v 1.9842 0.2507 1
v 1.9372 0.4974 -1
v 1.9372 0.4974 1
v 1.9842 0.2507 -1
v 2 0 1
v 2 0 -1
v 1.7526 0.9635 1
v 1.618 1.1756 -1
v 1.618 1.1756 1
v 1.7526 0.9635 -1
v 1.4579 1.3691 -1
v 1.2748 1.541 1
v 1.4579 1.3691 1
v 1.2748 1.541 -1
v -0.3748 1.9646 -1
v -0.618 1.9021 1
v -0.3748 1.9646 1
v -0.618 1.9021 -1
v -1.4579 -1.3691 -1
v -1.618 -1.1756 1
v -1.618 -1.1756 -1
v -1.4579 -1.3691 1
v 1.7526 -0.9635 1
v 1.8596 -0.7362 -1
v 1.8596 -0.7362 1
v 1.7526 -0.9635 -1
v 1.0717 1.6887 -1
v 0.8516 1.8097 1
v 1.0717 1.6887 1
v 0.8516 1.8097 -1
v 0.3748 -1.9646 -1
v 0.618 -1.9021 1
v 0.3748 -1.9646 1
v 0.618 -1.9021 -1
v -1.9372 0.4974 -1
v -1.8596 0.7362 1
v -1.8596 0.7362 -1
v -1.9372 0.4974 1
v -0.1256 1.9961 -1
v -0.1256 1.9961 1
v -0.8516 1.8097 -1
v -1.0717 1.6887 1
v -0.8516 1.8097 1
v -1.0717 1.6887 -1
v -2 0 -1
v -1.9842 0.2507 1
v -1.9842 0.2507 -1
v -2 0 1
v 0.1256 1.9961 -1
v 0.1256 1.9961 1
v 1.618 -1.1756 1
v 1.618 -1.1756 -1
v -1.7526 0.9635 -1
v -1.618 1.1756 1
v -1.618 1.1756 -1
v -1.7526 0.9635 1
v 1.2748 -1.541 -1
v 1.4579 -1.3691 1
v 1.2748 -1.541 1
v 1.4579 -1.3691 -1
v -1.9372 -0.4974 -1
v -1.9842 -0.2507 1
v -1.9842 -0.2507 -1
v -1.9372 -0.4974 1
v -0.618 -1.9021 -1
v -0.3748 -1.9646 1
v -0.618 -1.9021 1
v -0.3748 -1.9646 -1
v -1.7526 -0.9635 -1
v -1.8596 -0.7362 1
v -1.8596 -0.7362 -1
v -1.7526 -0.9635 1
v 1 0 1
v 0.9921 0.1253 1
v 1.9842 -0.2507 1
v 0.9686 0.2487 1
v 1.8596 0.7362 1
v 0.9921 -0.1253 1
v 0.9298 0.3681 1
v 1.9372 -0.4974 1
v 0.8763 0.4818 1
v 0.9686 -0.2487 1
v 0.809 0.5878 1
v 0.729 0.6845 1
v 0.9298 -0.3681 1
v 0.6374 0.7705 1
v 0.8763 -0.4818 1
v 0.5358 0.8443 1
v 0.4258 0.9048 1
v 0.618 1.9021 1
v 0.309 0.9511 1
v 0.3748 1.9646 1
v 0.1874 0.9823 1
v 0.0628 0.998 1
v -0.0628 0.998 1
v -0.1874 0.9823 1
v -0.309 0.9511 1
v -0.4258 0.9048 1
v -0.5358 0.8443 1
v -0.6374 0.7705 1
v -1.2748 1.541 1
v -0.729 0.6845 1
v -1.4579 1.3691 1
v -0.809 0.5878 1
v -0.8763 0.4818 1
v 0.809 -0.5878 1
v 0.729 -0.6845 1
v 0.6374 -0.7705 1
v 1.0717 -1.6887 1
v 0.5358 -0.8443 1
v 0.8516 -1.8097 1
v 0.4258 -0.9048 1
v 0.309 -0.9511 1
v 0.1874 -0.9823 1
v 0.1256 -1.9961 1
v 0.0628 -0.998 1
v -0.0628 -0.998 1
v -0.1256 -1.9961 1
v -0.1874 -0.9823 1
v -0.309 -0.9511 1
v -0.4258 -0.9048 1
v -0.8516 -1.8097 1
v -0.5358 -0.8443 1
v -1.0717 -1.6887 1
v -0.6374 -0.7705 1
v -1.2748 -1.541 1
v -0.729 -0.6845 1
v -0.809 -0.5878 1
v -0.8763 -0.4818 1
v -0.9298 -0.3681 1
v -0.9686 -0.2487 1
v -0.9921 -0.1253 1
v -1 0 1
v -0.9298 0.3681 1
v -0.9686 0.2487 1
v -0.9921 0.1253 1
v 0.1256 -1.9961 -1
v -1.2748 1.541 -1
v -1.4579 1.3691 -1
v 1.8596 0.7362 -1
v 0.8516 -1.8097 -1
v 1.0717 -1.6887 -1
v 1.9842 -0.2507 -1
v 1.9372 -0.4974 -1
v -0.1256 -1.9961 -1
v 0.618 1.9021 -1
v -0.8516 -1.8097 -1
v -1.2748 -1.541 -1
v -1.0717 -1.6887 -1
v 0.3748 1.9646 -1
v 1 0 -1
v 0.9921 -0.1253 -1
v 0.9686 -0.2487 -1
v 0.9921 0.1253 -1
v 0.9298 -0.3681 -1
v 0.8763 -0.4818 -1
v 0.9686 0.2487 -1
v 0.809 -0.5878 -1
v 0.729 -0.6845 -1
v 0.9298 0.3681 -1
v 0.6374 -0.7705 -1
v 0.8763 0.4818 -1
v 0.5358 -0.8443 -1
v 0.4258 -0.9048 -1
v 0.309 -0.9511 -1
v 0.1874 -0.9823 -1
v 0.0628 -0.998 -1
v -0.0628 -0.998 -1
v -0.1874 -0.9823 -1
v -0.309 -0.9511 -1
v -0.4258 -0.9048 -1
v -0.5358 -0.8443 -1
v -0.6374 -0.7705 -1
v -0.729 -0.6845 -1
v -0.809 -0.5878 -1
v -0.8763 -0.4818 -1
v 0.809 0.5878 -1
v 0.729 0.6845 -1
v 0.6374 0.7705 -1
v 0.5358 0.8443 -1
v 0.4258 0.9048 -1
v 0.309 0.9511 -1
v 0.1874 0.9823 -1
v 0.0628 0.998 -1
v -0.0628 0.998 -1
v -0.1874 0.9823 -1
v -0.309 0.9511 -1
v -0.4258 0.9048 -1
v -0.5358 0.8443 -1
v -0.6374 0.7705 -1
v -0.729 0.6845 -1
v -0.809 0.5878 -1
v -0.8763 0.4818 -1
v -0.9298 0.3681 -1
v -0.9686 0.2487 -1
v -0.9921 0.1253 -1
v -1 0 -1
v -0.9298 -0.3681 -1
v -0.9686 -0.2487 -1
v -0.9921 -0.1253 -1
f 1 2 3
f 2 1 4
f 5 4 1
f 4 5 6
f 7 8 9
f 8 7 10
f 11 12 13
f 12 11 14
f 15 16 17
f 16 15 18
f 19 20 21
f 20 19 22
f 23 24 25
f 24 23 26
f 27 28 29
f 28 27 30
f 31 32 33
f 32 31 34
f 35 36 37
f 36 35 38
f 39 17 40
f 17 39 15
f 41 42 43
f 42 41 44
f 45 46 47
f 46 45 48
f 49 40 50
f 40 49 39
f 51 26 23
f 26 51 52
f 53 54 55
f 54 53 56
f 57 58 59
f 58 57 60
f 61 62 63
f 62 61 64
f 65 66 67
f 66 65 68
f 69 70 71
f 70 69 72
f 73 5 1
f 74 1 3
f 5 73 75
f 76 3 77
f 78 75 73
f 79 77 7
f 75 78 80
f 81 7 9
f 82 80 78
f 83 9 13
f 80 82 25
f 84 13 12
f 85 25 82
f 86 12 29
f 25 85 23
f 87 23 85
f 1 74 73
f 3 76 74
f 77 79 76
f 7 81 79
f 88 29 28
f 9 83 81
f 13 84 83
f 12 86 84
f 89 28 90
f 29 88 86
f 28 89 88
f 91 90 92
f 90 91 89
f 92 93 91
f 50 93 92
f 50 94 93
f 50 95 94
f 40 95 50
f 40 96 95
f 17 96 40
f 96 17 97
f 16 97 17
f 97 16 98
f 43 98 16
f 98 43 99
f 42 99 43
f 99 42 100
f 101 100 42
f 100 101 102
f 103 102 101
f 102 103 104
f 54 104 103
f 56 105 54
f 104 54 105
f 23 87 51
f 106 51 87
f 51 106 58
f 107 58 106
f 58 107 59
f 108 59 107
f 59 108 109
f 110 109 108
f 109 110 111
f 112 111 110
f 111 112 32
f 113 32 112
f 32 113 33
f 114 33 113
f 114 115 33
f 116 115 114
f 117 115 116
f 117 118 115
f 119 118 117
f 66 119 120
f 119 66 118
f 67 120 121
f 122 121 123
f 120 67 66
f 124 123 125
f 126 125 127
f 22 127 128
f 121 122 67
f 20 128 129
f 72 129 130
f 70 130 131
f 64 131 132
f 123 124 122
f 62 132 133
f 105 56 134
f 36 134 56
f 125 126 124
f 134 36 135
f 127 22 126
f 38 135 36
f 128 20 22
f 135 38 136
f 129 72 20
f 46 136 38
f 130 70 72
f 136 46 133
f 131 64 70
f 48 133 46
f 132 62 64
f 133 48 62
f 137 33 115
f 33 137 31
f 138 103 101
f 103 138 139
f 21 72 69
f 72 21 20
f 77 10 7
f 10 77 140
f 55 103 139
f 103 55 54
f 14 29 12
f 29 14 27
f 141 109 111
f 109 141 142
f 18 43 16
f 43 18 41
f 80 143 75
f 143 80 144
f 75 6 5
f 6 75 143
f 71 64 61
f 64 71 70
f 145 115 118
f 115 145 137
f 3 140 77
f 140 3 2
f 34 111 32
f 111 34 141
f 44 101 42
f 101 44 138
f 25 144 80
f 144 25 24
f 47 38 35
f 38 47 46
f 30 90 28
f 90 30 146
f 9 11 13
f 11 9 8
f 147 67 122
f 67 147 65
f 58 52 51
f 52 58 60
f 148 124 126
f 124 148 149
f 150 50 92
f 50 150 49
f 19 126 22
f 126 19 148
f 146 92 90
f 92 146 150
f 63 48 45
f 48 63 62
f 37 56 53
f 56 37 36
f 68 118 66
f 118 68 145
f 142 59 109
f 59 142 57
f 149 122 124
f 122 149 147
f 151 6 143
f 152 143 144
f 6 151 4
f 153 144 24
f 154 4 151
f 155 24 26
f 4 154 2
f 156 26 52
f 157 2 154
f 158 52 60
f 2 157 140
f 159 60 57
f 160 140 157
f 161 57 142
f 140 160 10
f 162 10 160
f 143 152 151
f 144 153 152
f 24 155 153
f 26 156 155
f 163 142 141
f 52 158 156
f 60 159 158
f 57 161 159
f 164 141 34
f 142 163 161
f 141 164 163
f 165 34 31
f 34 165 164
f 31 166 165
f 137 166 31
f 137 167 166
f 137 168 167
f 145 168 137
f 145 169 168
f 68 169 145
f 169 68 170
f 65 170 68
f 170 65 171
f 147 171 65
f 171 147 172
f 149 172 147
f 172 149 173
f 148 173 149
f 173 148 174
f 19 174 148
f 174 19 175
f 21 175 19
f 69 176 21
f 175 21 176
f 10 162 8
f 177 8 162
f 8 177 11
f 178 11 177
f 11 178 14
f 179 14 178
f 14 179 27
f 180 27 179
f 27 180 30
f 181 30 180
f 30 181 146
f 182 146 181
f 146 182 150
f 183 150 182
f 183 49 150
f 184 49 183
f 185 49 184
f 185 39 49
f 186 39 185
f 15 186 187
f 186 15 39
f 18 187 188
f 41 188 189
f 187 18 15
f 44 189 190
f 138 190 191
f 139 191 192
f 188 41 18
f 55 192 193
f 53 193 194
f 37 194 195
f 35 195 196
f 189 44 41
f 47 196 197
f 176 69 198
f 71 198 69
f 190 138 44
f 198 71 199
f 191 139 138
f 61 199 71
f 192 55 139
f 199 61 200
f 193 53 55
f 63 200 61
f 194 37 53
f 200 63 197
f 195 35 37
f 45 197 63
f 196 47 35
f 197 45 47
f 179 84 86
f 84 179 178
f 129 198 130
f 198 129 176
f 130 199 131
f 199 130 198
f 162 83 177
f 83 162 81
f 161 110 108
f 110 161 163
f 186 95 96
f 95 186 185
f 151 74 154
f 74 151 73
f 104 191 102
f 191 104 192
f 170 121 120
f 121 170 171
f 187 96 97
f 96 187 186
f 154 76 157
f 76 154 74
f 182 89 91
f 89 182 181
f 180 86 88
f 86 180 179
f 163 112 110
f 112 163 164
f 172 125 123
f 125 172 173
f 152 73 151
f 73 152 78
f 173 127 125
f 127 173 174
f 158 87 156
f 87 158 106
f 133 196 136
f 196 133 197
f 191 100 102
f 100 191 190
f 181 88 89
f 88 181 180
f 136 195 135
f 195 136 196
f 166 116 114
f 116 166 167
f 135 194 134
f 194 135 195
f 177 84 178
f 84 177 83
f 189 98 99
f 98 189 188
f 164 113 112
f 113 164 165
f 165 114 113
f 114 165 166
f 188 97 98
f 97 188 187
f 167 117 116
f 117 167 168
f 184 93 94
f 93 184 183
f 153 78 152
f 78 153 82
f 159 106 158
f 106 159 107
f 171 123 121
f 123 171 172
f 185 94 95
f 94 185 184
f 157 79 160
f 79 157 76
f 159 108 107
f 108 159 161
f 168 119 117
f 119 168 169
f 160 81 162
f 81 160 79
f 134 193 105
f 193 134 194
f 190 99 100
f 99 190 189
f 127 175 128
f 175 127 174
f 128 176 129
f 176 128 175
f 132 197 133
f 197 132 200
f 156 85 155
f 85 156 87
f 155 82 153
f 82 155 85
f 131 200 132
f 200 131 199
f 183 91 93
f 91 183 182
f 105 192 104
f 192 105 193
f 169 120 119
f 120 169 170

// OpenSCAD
$fn = 50;


difference() {
	union() {
		translate(v = [0, 0, -1.0000000000]) {
			cylinder(h = 2, r = 2.0000000000);
		}
	}
	union() {
		translate(v = [0, 0, -100.0000000000]) {
			cylinder(h = 200, r = 1.0000000000);
		}
	}
}
